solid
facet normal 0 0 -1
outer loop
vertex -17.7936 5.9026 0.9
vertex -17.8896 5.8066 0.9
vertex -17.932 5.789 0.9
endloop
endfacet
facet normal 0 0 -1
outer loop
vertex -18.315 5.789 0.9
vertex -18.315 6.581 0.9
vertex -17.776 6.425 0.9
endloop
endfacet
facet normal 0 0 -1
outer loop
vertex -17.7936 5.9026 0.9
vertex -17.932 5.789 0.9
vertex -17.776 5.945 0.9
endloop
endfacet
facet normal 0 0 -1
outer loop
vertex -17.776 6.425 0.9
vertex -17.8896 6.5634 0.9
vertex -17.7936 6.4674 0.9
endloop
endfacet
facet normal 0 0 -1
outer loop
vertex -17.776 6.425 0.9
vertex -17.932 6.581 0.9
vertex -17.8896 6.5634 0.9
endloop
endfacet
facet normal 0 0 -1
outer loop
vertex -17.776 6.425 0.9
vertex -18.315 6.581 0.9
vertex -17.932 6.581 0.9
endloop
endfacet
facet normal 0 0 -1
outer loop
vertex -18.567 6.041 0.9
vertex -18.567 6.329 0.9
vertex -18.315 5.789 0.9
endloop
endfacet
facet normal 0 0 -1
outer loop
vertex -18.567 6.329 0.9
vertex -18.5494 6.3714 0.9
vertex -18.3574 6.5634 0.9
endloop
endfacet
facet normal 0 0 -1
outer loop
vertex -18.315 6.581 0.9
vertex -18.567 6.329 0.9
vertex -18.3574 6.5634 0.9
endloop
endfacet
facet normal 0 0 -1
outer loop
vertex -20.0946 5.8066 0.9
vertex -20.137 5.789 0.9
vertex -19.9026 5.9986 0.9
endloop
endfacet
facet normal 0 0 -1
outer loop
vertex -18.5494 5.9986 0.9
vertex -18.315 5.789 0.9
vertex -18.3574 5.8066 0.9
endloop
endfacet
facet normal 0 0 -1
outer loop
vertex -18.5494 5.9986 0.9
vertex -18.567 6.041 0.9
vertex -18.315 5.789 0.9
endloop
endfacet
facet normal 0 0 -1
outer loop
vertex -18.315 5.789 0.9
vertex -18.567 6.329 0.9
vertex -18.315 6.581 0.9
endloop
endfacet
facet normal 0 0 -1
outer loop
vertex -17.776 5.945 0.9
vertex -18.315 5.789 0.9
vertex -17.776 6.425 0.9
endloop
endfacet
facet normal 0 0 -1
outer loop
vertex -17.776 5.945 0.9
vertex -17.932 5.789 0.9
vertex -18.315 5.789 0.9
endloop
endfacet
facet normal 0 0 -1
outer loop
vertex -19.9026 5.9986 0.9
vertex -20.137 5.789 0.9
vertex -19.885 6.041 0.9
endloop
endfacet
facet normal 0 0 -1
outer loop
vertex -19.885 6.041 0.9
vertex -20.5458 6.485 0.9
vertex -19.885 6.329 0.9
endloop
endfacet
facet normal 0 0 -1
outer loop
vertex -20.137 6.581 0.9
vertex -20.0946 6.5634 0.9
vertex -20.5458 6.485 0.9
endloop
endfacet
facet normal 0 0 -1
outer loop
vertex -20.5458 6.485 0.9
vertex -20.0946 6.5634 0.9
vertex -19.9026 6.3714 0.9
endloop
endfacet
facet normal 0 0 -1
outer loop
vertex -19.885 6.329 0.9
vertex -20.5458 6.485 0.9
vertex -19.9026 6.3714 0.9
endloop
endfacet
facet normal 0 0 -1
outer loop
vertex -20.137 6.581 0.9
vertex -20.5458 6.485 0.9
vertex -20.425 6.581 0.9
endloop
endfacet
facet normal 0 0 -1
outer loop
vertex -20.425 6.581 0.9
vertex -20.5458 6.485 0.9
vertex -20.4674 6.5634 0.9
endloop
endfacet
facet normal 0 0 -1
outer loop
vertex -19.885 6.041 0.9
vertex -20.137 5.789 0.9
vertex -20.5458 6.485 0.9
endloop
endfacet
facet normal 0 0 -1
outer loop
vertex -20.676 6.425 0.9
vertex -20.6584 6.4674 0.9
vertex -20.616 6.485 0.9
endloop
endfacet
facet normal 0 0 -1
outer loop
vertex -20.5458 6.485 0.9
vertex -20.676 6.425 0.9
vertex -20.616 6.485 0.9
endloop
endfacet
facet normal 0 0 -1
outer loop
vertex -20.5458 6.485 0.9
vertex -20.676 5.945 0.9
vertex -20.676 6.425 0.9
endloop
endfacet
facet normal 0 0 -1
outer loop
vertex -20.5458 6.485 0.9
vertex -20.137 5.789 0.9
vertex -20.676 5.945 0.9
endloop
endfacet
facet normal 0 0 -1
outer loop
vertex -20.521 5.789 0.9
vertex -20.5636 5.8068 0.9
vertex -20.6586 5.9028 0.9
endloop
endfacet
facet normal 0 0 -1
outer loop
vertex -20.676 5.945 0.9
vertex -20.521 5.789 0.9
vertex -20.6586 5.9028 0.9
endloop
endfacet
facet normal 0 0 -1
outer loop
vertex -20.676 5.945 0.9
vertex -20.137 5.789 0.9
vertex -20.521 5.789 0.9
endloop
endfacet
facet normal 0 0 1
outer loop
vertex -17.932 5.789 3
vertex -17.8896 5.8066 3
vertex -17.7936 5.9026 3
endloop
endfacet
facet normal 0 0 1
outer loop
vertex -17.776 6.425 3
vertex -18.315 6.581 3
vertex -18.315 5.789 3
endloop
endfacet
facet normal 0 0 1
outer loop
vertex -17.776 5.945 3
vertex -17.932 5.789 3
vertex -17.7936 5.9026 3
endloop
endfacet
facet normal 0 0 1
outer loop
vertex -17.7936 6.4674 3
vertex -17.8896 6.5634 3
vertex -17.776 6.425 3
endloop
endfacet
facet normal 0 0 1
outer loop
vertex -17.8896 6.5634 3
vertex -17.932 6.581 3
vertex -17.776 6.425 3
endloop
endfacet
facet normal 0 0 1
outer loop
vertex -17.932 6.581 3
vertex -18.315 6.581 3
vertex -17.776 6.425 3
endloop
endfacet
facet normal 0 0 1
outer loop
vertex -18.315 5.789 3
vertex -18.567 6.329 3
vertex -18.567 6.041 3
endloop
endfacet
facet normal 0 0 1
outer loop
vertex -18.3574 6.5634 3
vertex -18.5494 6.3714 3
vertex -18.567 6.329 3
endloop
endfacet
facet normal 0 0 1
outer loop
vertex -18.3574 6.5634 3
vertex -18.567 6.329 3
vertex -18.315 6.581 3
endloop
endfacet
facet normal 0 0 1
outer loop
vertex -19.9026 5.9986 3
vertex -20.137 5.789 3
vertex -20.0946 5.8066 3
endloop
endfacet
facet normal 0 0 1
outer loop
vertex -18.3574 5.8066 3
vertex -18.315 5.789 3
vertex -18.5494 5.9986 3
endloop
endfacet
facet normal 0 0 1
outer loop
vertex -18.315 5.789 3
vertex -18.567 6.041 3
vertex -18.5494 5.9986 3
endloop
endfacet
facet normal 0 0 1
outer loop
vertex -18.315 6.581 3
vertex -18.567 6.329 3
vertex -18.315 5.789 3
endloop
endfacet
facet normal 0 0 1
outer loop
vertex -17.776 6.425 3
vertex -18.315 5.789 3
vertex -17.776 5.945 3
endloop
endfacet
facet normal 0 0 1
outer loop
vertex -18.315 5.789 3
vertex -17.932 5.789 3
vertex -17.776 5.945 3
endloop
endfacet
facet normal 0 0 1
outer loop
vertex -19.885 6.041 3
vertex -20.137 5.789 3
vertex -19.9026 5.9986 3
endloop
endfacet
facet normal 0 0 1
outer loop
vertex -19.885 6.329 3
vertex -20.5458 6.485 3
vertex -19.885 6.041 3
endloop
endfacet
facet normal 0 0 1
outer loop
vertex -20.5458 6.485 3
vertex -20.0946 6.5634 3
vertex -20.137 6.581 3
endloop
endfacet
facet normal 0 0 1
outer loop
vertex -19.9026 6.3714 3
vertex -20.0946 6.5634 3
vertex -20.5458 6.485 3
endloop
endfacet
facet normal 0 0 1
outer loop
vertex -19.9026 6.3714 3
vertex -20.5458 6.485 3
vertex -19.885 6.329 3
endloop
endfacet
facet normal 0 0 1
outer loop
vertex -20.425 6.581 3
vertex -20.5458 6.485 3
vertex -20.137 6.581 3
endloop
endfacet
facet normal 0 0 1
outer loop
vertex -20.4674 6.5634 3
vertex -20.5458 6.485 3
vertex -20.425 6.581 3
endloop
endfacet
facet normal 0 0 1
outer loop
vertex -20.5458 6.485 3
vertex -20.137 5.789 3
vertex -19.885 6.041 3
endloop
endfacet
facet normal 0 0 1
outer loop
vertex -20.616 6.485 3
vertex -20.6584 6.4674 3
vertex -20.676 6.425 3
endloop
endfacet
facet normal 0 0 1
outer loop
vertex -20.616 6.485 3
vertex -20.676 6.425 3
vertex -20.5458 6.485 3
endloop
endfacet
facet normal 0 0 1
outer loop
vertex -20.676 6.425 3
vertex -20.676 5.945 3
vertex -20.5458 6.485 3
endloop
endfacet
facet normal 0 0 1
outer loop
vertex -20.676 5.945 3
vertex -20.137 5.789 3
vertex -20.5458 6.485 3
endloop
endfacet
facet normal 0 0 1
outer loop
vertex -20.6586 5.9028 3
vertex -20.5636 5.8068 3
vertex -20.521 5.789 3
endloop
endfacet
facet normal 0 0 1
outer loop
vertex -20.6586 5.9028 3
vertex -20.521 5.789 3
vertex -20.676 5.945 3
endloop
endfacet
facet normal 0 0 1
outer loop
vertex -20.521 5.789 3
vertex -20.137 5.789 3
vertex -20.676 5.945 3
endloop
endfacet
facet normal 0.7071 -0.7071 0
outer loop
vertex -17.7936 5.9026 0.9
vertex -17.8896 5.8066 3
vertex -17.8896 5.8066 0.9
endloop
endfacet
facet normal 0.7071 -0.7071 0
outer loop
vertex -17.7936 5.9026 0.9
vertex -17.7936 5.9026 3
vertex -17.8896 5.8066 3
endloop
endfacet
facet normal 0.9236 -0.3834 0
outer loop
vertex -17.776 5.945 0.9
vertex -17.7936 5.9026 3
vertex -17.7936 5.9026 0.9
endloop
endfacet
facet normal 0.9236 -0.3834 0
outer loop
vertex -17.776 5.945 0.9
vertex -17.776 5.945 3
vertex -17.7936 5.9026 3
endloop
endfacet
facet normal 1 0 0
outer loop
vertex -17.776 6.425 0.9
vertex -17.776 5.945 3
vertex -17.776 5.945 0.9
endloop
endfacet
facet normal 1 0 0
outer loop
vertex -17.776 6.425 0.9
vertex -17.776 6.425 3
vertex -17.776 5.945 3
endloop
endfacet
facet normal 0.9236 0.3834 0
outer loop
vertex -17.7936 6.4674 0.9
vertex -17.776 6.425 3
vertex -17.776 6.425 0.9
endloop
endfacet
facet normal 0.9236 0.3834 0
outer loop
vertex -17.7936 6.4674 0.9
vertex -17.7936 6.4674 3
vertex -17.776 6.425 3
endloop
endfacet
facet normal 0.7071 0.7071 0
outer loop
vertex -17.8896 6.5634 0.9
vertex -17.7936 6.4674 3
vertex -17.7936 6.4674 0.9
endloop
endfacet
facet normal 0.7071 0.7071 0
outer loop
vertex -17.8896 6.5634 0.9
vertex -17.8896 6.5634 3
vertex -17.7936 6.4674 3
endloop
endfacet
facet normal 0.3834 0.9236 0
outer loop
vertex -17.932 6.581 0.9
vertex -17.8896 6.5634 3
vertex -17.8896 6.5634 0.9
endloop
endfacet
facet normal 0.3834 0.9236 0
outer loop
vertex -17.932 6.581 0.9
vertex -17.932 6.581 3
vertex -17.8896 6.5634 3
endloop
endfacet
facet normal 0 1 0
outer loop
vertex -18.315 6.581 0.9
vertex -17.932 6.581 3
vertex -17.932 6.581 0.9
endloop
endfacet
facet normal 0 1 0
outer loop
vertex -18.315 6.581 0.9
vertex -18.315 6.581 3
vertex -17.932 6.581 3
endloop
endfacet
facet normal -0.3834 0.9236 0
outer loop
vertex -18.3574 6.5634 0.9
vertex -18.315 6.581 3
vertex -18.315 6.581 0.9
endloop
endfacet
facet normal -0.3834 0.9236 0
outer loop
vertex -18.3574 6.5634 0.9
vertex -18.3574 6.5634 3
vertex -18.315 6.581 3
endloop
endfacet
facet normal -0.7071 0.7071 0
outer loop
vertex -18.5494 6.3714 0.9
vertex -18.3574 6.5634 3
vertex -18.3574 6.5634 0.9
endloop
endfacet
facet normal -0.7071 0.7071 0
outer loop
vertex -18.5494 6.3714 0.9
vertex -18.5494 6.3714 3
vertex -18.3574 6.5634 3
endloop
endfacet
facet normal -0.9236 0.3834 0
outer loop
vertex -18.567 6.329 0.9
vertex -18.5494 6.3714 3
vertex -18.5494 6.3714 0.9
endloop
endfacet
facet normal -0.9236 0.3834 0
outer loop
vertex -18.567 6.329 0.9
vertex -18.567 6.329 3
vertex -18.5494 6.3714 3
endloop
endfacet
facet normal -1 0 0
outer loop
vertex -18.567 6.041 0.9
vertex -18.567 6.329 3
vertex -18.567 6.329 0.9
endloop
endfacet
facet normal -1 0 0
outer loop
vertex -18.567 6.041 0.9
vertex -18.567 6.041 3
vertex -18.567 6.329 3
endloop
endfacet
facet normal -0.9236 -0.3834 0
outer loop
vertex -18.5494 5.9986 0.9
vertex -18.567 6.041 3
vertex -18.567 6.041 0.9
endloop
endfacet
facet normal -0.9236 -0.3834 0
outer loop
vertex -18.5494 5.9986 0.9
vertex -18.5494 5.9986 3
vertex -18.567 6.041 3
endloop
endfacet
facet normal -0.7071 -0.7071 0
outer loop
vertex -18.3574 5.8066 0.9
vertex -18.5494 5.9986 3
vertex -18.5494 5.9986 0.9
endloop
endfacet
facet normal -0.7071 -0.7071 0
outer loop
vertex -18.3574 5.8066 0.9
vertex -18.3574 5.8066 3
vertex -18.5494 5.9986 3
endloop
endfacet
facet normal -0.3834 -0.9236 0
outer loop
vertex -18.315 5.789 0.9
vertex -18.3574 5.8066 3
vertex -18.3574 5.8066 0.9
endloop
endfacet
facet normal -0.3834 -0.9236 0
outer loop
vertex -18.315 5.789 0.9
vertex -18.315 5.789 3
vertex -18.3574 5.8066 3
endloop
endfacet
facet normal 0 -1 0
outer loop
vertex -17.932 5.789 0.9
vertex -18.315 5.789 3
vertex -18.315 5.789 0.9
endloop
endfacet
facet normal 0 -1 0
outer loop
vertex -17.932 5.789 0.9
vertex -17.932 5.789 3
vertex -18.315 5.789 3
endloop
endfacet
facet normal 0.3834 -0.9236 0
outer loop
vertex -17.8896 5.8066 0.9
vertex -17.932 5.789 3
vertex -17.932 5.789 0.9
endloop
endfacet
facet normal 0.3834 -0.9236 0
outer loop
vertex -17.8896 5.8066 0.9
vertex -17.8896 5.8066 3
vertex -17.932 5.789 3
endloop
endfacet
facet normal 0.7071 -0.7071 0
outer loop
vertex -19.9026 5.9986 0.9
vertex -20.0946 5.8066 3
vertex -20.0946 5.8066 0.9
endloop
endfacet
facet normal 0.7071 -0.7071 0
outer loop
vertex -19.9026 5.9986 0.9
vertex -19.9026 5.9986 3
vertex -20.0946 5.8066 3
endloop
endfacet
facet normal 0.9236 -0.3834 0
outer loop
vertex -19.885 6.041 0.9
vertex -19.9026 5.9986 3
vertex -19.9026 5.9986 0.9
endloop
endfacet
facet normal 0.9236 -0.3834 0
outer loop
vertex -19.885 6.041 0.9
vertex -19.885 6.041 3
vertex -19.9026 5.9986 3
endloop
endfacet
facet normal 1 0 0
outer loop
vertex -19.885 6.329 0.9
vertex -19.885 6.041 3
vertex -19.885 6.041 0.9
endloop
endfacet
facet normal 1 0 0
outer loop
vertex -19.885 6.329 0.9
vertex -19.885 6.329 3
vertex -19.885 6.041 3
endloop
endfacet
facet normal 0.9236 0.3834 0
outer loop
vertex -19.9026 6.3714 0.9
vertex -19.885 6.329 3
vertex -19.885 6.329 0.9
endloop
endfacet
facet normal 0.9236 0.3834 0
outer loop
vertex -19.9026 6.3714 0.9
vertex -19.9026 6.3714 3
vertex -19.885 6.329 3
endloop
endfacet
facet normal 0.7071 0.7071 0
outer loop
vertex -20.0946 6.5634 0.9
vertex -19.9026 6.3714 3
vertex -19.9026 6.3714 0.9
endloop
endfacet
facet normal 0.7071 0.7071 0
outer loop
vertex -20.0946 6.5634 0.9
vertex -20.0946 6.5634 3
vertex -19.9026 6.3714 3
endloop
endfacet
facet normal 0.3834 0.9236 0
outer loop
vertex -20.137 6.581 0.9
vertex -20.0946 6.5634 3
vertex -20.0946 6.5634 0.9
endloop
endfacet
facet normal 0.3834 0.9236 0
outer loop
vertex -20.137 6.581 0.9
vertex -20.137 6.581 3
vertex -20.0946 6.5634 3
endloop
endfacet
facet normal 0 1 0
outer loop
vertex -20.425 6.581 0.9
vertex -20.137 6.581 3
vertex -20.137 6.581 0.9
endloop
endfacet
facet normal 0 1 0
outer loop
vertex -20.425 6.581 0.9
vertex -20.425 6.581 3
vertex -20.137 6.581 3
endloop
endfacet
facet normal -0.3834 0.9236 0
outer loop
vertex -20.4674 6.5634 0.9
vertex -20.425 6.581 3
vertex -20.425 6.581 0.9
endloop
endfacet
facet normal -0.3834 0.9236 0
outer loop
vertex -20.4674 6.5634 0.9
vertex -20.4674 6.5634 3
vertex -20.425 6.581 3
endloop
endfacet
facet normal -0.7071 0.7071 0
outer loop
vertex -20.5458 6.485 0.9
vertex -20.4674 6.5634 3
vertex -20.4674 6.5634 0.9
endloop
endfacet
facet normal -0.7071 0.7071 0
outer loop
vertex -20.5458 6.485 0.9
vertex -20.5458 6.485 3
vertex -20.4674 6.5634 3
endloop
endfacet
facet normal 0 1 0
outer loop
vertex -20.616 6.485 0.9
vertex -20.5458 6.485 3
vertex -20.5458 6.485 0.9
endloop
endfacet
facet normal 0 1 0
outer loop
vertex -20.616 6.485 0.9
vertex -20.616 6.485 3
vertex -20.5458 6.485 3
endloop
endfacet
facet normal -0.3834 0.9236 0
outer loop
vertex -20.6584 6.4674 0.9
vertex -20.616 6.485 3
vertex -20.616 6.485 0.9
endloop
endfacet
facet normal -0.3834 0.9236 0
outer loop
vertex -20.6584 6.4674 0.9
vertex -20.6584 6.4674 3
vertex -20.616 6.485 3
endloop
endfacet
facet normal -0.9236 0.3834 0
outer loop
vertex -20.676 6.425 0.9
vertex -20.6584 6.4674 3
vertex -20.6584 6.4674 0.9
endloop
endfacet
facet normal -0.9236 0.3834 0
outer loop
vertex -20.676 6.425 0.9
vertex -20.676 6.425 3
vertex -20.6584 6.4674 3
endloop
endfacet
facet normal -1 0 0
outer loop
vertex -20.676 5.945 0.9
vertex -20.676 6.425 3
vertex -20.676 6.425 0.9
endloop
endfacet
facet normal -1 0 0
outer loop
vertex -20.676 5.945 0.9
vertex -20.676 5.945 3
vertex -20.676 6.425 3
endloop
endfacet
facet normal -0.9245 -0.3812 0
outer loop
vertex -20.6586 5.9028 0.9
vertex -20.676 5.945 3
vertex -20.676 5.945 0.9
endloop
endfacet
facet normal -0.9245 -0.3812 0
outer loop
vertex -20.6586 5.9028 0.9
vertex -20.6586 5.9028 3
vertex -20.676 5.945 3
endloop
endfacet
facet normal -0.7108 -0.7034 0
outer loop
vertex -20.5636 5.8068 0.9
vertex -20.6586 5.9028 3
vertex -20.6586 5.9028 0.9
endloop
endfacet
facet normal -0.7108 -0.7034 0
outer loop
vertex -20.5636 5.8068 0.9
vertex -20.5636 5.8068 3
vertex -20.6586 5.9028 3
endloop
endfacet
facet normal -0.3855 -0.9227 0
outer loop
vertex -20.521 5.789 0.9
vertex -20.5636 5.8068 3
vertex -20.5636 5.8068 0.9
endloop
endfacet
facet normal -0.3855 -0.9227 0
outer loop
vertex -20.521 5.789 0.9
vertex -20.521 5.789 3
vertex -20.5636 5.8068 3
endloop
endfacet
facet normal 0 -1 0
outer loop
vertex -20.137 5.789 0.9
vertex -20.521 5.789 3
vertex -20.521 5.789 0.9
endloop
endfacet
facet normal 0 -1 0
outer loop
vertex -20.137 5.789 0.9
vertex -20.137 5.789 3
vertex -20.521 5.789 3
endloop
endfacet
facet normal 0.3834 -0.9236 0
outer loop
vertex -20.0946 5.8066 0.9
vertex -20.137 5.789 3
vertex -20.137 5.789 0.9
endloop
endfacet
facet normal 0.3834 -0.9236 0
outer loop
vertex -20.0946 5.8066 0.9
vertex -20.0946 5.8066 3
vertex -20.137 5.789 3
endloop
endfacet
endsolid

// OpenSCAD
$fn = 24;
translate([0, 0.000, 0.900])
  linear_extrude(height=2.100) {
offset(r=0.06, $fn=8) {
    polygon(points=[[-18.315,6.521],[-18.507,6.329],[-18.507,6.041],[-18.315,5.849],[-17.932,5.849],[-17.836,5.945],[-17.836,6.425],[-17.932,6.521]], paths=[[0,1,2,3,4,5,6,7]]);
    polygon(points=[[-20.616,6.425],[-20.616,5.945],[-20.521,5.849],[-20.137,5.849],[-19.945,6.041],[-19.945,6.329],[-20.137,6.521],[-20.425,6.521],[-20.521,6.425]], paths=[[0,1,2,3,4,5,6,7,8]]);
}
}
